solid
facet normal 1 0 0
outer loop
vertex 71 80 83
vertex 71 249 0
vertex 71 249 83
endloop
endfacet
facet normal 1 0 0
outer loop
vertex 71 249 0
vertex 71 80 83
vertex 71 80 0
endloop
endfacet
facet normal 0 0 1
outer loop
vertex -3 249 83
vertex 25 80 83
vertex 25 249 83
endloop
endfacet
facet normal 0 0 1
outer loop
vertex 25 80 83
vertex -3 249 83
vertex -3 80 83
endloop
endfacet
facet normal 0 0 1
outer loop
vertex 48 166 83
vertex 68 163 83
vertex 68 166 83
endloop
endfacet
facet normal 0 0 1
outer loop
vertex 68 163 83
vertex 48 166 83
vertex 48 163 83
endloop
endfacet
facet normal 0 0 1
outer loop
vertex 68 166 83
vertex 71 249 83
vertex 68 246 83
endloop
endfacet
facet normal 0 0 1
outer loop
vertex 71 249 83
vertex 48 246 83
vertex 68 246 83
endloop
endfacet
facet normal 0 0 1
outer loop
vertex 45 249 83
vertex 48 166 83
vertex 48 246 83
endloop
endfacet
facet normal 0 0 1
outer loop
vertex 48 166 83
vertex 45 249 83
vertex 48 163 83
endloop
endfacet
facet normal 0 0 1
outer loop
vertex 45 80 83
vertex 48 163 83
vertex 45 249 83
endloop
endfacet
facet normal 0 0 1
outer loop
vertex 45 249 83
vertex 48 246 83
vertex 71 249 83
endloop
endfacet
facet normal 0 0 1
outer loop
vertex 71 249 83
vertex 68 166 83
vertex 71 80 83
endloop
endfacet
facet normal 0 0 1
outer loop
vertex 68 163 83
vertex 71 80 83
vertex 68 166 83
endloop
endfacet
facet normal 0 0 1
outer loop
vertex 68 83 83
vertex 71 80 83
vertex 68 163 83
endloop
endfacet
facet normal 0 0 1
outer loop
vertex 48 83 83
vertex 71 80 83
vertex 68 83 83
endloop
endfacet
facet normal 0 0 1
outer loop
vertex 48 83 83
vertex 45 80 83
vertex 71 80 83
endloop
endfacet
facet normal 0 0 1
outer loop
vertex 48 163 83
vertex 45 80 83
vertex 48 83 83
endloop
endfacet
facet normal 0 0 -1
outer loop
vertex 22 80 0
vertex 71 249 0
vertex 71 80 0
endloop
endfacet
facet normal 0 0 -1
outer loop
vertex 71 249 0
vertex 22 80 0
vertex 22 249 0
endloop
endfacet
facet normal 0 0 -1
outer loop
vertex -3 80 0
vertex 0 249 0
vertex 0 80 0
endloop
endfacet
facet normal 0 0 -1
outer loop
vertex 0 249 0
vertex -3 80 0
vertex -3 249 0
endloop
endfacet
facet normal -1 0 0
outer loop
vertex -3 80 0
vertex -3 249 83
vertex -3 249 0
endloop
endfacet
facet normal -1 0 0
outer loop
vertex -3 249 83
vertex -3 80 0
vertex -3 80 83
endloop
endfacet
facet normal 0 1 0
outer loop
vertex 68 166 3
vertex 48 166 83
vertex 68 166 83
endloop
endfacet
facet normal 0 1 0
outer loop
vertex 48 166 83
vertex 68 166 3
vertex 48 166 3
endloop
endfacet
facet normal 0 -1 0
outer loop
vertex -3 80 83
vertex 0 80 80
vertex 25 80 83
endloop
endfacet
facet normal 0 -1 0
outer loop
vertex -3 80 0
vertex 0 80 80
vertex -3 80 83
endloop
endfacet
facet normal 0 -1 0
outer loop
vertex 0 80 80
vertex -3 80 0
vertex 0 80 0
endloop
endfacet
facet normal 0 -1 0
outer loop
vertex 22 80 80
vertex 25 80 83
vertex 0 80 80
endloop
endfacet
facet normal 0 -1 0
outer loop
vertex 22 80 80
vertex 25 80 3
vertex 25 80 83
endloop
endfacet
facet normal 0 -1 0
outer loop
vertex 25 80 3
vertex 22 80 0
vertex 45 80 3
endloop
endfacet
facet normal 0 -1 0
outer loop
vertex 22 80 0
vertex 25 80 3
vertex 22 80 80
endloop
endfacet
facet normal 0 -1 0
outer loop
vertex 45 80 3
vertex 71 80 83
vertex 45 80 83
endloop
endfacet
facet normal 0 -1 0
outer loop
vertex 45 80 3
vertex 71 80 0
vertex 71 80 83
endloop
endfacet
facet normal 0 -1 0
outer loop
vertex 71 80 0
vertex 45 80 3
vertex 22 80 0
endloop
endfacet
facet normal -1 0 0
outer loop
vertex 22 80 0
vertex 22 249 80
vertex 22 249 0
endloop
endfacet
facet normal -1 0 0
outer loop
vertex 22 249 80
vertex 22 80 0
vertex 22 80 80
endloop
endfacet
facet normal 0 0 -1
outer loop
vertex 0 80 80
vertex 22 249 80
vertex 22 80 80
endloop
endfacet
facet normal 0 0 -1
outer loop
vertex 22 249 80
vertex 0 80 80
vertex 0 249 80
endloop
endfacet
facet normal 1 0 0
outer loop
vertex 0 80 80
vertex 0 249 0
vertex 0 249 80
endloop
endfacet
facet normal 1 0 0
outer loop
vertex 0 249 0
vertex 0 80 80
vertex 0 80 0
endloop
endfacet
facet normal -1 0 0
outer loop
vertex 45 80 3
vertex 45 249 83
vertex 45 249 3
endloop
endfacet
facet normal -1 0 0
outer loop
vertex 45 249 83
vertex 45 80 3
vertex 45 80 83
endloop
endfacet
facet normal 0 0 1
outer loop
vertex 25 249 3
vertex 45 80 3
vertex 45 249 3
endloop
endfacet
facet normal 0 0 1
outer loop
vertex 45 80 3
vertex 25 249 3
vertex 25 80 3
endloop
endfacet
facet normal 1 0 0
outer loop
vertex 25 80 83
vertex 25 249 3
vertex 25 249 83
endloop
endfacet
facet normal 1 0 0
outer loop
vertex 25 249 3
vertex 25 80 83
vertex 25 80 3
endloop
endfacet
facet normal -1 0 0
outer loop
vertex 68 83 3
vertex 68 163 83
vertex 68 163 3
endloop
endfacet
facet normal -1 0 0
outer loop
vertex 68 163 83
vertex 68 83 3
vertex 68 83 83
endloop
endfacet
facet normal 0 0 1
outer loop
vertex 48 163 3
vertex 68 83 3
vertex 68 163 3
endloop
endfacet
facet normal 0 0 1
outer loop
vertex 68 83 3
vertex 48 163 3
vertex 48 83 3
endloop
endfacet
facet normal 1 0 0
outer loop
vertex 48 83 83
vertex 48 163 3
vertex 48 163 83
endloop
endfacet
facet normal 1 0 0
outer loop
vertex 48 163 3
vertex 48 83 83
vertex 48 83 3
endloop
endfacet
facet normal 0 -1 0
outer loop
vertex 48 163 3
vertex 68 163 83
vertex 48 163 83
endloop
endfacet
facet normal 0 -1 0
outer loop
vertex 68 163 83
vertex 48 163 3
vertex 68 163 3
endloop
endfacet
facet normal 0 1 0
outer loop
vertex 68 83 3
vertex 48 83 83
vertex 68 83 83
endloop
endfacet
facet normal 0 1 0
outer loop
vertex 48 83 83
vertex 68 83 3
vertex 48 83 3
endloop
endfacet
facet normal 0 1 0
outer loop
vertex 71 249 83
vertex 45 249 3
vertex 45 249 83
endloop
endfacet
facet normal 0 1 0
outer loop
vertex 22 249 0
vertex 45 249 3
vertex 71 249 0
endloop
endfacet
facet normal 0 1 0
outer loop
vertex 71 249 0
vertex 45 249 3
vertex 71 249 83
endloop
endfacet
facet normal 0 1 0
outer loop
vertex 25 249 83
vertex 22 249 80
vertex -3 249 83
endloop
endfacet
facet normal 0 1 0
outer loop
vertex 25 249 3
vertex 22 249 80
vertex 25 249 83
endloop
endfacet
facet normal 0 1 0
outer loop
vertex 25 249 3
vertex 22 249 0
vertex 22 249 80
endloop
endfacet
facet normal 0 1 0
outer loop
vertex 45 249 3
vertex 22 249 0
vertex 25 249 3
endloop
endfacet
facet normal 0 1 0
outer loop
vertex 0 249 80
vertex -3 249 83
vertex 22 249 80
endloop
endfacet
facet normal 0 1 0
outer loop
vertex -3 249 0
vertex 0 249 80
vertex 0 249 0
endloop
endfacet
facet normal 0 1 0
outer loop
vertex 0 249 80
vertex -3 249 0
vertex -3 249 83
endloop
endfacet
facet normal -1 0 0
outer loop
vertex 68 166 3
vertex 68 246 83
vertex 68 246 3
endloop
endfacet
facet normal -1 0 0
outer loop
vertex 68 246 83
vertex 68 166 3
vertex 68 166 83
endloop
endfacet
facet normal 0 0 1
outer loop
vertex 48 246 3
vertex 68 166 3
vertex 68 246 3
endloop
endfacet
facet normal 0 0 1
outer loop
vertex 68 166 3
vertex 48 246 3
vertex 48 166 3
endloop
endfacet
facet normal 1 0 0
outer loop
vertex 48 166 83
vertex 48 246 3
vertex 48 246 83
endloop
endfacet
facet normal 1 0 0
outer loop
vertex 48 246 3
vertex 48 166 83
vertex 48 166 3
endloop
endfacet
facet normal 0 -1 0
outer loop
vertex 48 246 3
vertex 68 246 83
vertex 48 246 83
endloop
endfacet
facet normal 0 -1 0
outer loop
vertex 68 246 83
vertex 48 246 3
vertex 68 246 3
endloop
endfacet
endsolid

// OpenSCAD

// Size of the clip, thickness of the bed frame +2mm seems to work well
clip_width = 22; // [1:0.5:50]

// Width of the phone slot
phone_slot_width = 80; // [10:200]

// Height of the phone slot
phone_slot_height = 80; // [10:200]

// Thickness of the phone slot
phone_slot_thickness = 20; // [1:100]

// Thickness of the clip/box, lower to save time/material, higher to increase strength 
clip_thickness = 3; // [1:20]

// Thickness of the tablet slot, set to 0 to remove it
tablet_slot_thickness = 20; // [0:100]

// Number of phone slots side-by-side
number_of_phone_slots = 2; //  [1, 2, 3, 4, 5, 6, 7, 8, 9, 10]


bed_caddy(  clip_width, 
            phone_slot_width, 
            phone_slot_height, 
            phone_slot_thickness, 
            clip_thickness, 
            tablet_slot_thickness, 
            number_of_phone_slots );

module bed_caddy(clip_length, width, height, depth, thickness, tablet_thickness, phone_slots) {
    for (i =[1:phone_slots])
        translate([0,i*(width+thickness),0]) phone_holder(clip_length, width, height, depth, thickness, tablet_thickness);
    
}

module phone_holder(clip_length, width, height, depth, thickness, tablet_thickness) {
    tablet_offset = tablet_thickness ? thickness + tablet_thickness : 0;
    total_depth = clip_length+depth+thickness*3+tablet_offset;

    difference(){
        translate([-thickness,-thickness,0]) 
            cube([total_depth, width+thickness*2, height+thickness]);
        
        translate([0,-thickness-1,-1])
            cube([clip_length, width+thickness*2+2, height+1]);
        
        translate([clip_length+thickness,-thickness-1,thickness])
            cube([tablet_thickness, width+thickness*2+2, height+1]);
        
        translate([clip_length+thickness+tablet_offset,0,thickness]) 
            cube([depth, width, height+1]);
    }
}
